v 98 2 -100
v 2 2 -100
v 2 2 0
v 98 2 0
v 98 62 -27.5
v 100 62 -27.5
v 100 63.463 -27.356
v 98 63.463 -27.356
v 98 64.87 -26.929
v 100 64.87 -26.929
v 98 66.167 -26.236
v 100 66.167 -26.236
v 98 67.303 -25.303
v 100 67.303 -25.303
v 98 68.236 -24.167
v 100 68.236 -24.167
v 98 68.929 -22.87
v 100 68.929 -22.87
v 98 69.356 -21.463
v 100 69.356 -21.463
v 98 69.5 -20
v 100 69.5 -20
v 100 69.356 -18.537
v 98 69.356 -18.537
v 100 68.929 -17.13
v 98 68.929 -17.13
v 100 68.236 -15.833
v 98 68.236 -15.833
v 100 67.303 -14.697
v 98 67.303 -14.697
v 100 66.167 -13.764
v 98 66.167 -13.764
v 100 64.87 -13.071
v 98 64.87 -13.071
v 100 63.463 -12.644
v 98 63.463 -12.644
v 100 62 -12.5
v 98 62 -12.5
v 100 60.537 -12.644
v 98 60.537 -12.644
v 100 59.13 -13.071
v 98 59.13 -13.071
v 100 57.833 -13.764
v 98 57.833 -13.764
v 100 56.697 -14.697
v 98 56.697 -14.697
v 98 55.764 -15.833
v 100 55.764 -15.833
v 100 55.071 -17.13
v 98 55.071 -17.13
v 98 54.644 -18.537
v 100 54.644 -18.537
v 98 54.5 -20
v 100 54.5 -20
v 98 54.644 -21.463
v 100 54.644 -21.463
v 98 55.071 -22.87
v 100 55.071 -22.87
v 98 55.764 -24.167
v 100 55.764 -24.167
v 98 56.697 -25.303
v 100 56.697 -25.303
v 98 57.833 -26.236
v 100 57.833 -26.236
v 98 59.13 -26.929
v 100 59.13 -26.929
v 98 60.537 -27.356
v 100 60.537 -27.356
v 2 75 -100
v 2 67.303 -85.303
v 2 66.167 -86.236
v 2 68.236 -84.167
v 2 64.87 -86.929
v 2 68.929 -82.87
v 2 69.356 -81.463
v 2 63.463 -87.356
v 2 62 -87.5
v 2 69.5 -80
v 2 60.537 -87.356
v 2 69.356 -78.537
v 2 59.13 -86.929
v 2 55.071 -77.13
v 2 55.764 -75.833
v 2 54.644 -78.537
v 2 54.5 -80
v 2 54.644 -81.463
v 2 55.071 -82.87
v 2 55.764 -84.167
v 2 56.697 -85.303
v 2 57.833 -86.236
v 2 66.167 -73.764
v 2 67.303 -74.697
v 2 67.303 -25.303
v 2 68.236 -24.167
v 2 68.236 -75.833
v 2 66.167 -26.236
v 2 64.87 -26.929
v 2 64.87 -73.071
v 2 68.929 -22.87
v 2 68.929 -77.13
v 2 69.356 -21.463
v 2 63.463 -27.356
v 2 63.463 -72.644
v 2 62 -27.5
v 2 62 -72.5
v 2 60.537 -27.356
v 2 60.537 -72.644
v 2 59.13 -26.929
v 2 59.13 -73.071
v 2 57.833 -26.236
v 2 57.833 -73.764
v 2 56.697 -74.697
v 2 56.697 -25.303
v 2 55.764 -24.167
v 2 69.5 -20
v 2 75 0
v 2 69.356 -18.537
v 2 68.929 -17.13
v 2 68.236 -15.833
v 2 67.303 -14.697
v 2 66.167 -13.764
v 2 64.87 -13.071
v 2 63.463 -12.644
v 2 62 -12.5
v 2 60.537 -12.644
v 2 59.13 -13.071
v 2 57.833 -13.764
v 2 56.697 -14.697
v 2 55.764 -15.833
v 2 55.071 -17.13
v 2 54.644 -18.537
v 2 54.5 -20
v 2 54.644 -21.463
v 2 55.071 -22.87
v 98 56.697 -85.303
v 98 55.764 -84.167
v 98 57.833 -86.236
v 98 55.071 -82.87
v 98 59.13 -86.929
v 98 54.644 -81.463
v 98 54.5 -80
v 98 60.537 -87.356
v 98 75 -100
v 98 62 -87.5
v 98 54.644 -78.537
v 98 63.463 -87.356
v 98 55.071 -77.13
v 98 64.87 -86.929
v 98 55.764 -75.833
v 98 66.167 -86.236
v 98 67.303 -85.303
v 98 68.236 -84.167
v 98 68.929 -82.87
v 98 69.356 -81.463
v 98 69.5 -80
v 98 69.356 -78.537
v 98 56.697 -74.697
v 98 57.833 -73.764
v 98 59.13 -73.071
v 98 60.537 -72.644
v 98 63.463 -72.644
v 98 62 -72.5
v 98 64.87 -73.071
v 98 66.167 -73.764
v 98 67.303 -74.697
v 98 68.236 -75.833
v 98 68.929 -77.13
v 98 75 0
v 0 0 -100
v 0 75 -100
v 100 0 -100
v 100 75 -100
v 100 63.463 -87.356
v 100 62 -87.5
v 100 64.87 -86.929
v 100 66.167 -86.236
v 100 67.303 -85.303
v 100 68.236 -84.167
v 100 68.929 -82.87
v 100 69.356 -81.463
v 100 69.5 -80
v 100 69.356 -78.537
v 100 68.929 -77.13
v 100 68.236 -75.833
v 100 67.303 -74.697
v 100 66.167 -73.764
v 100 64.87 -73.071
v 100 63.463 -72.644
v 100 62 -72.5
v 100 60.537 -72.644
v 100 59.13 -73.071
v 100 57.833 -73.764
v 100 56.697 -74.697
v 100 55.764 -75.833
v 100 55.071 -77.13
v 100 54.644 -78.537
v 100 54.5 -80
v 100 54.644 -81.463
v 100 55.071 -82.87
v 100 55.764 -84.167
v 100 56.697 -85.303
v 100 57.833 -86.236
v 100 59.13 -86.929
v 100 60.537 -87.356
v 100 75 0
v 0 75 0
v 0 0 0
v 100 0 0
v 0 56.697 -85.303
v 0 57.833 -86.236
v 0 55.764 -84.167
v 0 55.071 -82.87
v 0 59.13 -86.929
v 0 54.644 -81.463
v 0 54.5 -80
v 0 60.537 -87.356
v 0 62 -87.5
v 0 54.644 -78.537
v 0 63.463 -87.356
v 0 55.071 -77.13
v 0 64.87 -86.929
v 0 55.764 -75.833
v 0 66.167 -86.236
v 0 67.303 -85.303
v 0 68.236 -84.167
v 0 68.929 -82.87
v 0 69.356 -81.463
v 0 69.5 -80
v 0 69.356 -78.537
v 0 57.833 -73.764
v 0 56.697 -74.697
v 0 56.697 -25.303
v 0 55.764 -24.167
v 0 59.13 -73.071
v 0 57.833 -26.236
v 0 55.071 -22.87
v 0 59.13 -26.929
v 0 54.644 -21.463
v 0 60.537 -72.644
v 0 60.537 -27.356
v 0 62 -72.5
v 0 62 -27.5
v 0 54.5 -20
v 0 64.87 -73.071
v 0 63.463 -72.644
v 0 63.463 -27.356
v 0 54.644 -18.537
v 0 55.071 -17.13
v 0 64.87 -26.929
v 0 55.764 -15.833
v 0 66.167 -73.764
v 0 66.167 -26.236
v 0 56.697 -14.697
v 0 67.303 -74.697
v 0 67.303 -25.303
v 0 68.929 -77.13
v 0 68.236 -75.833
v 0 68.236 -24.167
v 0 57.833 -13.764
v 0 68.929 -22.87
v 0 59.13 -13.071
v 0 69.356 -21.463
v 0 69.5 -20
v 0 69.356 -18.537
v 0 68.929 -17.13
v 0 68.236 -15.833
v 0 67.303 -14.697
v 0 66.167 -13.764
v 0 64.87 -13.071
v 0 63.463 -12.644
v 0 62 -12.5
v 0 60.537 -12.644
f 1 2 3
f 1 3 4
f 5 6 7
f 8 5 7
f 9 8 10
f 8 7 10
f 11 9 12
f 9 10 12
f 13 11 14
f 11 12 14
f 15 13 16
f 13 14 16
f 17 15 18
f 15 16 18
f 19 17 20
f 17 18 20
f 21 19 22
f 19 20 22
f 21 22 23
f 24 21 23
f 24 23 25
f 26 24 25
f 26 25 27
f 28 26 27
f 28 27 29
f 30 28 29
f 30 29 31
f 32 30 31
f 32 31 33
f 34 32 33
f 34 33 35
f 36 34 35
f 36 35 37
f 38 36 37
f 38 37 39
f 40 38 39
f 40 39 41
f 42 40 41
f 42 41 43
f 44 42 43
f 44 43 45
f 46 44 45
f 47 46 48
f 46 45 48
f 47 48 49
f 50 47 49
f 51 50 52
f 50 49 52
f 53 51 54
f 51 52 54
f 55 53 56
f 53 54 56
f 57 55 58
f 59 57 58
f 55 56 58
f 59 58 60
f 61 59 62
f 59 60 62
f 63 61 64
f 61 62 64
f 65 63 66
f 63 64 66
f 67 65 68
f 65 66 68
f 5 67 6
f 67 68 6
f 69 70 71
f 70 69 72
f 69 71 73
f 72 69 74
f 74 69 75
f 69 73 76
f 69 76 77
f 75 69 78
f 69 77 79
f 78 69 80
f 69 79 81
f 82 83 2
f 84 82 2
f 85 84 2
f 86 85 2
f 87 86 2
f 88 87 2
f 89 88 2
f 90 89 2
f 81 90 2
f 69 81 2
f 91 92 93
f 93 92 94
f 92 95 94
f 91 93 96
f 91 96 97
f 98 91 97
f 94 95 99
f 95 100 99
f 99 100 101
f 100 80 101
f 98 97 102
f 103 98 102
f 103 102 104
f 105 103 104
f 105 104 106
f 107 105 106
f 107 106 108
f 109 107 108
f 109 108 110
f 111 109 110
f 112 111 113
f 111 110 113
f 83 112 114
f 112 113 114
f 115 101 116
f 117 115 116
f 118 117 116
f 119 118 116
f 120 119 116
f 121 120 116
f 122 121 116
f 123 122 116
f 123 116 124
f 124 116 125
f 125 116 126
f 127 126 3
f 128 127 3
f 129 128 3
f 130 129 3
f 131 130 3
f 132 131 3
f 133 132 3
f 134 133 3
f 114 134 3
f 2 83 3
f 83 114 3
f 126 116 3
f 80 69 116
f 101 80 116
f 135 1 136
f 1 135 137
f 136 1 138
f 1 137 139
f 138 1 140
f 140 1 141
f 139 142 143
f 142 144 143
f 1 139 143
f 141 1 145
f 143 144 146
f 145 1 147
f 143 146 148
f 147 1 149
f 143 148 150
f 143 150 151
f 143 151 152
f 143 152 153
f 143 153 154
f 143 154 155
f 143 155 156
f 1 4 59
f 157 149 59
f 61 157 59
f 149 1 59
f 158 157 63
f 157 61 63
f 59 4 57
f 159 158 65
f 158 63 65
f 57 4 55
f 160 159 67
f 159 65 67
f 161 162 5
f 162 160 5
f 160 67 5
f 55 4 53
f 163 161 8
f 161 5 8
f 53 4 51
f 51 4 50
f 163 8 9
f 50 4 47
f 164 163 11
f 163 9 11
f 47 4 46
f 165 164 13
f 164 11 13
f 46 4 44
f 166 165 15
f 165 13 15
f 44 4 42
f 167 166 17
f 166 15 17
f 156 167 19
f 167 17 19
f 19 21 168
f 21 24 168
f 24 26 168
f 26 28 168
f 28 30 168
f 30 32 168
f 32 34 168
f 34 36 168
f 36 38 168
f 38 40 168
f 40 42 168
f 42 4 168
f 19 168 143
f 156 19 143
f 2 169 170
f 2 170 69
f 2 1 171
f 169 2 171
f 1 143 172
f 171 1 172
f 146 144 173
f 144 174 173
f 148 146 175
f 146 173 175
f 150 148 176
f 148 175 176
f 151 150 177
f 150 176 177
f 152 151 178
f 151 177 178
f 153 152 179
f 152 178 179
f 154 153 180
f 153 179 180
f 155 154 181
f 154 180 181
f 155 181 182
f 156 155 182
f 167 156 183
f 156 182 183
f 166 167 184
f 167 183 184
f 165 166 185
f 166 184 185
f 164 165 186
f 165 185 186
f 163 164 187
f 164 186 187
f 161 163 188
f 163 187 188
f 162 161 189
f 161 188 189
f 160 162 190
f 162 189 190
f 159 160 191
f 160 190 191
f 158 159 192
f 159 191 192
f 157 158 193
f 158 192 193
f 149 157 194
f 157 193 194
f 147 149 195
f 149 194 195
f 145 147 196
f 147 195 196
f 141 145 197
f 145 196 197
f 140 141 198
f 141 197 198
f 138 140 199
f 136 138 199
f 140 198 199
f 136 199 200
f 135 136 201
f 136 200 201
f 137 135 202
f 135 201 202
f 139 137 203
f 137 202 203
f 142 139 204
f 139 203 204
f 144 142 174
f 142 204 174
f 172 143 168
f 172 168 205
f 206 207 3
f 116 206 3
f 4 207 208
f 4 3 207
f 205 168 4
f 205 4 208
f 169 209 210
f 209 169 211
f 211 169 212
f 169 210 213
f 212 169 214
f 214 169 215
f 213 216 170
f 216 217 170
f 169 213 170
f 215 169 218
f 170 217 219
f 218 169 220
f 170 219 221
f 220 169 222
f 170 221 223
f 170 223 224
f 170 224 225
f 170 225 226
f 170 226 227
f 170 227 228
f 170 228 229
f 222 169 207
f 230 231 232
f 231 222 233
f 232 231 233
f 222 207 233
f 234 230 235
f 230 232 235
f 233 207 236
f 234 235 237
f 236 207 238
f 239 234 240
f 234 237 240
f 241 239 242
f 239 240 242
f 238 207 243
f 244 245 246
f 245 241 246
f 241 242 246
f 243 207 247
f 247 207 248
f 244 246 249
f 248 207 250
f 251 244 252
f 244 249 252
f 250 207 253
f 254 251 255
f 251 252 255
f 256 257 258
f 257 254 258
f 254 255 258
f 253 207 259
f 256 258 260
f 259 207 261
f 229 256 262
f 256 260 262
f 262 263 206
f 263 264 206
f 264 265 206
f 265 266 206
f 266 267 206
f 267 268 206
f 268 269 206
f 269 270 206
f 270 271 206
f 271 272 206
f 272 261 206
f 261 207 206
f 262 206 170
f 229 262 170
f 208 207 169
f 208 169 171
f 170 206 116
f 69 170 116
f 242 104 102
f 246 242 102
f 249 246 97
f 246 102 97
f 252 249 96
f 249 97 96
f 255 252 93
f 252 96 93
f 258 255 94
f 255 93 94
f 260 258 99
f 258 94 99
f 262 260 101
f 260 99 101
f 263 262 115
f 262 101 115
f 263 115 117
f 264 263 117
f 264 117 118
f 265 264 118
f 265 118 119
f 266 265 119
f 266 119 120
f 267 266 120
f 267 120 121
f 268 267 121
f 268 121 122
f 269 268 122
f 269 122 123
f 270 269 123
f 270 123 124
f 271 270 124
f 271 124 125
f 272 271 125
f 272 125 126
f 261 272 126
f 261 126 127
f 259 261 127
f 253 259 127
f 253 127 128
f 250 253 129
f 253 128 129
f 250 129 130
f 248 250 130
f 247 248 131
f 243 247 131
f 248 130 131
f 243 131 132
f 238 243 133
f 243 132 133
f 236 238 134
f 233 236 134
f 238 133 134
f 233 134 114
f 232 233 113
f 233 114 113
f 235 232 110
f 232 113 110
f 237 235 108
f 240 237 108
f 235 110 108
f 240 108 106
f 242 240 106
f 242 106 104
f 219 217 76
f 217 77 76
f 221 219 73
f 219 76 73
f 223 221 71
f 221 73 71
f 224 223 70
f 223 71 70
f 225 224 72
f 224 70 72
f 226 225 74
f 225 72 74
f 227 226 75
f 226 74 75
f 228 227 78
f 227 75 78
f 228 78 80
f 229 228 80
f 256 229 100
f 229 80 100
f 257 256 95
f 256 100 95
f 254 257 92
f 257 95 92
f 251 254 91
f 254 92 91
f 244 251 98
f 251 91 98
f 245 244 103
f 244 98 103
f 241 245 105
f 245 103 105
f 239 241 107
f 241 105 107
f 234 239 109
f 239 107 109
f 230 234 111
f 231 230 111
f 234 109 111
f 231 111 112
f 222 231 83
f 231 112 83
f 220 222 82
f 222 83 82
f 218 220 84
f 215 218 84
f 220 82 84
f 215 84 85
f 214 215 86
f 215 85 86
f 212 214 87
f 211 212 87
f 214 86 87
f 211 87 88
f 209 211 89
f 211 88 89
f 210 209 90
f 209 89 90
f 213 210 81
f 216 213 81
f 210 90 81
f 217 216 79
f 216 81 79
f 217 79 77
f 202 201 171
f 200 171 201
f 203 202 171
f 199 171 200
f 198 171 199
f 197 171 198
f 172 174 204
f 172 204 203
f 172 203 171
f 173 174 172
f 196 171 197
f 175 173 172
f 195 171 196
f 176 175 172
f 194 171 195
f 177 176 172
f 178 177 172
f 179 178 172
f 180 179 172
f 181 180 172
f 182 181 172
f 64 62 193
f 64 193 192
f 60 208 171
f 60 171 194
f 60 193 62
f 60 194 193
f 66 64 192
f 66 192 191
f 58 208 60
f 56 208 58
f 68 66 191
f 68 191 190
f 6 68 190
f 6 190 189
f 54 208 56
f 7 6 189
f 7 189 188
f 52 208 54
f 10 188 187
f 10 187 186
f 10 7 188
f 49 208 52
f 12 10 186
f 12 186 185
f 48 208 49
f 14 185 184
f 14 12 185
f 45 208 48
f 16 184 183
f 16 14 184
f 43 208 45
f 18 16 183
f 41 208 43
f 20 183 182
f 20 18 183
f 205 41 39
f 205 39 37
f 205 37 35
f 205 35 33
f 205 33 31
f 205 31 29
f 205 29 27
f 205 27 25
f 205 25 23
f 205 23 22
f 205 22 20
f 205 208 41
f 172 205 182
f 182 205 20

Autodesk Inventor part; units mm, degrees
ref_plane "YZ Plane" through (0, 0, 0) normal (1, 0, 0) x (0, 1, 0)
ref_plane "XZ Plane" through (0, 0, 0) normal (0, 1, 0) x (-1, 0, 0)
ref_plane "XY Plane" through (0, 0, 0) normal (0, 0, 1) x (1, 0, 0)
sketch "Sketch1" plane through (0, 0, 0) normal (0, 0, 1) x (1, 0, 0)
  line L0 (0, 0) -> (0, 75)
  line L1 (0, 0) -> (100, 0)
  line L2 (100, 0) -> (100, 75)
  line L3 (0, 75) -> (2, 75)
  line L4 (2, 75) -> (2, 2)
  line L5 (2, 2) -> (98, 2)
  line L6 (98, 2) -> (98, 75)
  line L7 (98, 75) -> (100, 75)
  dimension "d0" = 75
  dimension "d1" = 100
  dimension "d2" = 75
  dimension "d3" = 2
  dimension "d4" = 73
  dimension "d5" = 96
extrude "Extrusion1" add sketch "Sketch1" against normal blind 100
sketch "Sketch2" plane through (100, 0, 0) normal (1, 0, 0) x (0, 0, -1)
  line L0 (0, 75) -> (100, 75) projected
  line L1 (0, 75) -> (20, 75)
  line L2 (100, 2) -> (100, 75) projected
  line L3 (20, 75) -> (20, 62)
  line L4 (20, 62) -> (80, 62)
  circle A0 centre (20, 62) radius 7.5
  circle A1 centre (80, 62) radius 7.5
  point P0 (0, 0)
  dimension "d8" = 20
  dimension "d9" = 13
  dimension "d10" = 60
  dimension "d11" = 15
  dimension "d12" = 15
extrude "Extrusion2" cut sketch "Sketch2" against normal through all
properties part number "motor holder"
